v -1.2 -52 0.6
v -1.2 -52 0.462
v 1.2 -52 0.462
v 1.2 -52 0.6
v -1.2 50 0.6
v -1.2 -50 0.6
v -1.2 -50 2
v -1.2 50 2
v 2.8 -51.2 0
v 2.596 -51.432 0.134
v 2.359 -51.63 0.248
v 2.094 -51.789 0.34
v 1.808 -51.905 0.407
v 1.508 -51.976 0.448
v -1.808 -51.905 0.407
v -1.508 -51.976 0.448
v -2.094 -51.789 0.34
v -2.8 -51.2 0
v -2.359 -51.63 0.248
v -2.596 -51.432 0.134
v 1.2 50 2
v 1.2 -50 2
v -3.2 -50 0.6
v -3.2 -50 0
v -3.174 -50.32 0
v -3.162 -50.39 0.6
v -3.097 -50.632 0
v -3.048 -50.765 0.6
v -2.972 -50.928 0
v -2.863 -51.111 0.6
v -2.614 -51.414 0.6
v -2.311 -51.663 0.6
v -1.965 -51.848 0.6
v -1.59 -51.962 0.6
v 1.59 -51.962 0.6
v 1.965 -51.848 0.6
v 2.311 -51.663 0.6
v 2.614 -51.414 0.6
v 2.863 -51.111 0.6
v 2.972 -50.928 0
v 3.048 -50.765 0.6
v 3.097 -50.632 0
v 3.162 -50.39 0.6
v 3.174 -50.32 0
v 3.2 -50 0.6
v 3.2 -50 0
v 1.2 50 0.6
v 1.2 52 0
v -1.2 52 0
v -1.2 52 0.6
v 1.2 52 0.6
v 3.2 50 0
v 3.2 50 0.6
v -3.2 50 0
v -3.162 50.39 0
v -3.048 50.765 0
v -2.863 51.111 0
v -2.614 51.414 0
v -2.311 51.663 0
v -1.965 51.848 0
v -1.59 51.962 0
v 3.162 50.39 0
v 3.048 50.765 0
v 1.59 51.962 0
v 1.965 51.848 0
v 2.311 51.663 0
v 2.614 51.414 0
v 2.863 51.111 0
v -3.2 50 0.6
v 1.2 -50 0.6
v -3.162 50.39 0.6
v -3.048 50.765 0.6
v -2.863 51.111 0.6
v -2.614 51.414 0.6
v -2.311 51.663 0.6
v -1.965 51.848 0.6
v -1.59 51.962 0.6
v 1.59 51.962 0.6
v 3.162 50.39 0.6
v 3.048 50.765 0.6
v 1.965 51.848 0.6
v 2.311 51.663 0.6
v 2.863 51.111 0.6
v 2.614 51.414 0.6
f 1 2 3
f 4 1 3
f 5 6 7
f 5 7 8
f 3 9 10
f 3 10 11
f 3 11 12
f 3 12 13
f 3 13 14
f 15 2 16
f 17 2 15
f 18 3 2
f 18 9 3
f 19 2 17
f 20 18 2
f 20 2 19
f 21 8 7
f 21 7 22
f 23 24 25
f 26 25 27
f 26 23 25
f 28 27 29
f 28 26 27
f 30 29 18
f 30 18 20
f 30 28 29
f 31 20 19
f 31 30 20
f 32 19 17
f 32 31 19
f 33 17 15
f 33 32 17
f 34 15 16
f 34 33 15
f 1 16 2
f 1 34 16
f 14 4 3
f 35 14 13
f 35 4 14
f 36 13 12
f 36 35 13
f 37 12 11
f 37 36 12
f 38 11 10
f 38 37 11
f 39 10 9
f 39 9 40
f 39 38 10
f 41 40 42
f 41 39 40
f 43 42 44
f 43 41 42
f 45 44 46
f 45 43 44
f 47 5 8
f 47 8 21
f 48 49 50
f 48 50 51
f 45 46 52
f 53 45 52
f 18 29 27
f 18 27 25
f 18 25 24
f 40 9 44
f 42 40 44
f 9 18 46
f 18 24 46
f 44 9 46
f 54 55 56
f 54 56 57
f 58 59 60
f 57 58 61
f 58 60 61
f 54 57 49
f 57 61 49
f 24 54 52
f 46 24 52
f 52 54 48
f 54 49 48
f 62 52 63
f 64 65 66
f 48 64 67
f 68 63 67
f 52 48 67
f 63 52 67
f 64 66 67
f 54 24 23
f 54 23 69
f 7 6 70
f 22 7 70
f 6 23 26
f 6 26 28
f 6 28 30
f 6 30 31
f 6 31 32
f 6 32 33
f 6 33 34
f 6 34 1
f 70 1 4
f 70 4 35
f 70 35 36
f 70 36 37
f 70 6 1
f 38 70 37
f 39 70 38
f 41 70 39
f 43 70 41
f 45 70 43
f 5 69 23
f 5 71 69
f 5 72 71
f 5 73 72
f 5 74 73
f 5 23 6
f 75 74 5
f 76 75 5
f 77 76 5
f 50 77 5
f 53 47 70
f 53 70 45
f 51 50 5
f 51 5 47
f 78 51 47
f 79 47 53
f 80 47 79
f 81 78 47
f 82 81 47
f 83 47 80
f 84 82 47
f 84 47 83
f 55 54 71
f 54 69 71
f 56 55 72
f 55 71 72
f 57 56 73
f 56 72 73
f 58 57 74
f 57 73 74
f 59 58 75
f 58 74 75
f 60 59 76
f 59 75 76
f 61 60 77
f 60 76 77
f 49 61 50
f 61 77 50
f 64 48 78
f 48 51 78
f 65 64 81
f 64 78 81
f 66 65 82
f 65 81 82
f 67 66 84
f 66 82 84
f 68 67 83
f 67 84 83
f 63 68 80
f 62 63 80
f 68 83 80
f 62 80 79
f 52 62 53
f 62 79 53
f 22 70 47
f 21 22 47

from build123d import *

# Parameters (mm, degrees)
F0_W        = 6.4
F0_H        = 104
F0_W_2      = 2.4
F0_H_2      = 100
F1_DEPTH    = 0.6
F2_DEPTH    = 2
F3_R        = 2
F4_T1_DEPTH = 6.5393372074


# Not quite as in the source:
# - a fillet or chamfer that OpenCascade refuses, or shapes differently, is made with other operations: its cross-section is extruded or revolved along the edge and cut away or added


with BuildPart() as f1:
    # F0 (on Top) → F1 (new body)
    with BuildSketch(Plane.XY):
        Rectangle(F0_W, F0_H)
        Rectangle(F0_W_2, F0_H_2, mode=Mode.SUBTRACT)
    extrude(amount=F1_DEPTH)

    # F0 (on Top) → F2 (join)
    with BuildSketch(Plane.XY):
        Rectangle(F0_W_2, F0_H_2)
    extrude(amount=F2_DEPTH)

    # F3
    f3_edges = [f1.edges().sort_by_distance(p)[0] for p in [
        (-3.2, -52, 0.3),
        (-3.2, 52, 0.3),
        (3.2, 52, 0.3),
        (3.2, -52, 0.3),
    ]]
    fillet(f3_edges, radius=F3_R)

    # F4: chamfer of 0.8 x 0.4618802154 on 1 edges, made by hand

    # F4_s2 → F4_t1 (cut)
    with BuildSketch(Plane.YZ.offset(-3.2696686037)):
        Polygon((-51.2, 0), (-52, 0.4618802154), (-52, 0), align=None)
    extrude(amount=F4_T1_DEPTH, mode=Mode.SUBTRACT)


solid = f1.part
